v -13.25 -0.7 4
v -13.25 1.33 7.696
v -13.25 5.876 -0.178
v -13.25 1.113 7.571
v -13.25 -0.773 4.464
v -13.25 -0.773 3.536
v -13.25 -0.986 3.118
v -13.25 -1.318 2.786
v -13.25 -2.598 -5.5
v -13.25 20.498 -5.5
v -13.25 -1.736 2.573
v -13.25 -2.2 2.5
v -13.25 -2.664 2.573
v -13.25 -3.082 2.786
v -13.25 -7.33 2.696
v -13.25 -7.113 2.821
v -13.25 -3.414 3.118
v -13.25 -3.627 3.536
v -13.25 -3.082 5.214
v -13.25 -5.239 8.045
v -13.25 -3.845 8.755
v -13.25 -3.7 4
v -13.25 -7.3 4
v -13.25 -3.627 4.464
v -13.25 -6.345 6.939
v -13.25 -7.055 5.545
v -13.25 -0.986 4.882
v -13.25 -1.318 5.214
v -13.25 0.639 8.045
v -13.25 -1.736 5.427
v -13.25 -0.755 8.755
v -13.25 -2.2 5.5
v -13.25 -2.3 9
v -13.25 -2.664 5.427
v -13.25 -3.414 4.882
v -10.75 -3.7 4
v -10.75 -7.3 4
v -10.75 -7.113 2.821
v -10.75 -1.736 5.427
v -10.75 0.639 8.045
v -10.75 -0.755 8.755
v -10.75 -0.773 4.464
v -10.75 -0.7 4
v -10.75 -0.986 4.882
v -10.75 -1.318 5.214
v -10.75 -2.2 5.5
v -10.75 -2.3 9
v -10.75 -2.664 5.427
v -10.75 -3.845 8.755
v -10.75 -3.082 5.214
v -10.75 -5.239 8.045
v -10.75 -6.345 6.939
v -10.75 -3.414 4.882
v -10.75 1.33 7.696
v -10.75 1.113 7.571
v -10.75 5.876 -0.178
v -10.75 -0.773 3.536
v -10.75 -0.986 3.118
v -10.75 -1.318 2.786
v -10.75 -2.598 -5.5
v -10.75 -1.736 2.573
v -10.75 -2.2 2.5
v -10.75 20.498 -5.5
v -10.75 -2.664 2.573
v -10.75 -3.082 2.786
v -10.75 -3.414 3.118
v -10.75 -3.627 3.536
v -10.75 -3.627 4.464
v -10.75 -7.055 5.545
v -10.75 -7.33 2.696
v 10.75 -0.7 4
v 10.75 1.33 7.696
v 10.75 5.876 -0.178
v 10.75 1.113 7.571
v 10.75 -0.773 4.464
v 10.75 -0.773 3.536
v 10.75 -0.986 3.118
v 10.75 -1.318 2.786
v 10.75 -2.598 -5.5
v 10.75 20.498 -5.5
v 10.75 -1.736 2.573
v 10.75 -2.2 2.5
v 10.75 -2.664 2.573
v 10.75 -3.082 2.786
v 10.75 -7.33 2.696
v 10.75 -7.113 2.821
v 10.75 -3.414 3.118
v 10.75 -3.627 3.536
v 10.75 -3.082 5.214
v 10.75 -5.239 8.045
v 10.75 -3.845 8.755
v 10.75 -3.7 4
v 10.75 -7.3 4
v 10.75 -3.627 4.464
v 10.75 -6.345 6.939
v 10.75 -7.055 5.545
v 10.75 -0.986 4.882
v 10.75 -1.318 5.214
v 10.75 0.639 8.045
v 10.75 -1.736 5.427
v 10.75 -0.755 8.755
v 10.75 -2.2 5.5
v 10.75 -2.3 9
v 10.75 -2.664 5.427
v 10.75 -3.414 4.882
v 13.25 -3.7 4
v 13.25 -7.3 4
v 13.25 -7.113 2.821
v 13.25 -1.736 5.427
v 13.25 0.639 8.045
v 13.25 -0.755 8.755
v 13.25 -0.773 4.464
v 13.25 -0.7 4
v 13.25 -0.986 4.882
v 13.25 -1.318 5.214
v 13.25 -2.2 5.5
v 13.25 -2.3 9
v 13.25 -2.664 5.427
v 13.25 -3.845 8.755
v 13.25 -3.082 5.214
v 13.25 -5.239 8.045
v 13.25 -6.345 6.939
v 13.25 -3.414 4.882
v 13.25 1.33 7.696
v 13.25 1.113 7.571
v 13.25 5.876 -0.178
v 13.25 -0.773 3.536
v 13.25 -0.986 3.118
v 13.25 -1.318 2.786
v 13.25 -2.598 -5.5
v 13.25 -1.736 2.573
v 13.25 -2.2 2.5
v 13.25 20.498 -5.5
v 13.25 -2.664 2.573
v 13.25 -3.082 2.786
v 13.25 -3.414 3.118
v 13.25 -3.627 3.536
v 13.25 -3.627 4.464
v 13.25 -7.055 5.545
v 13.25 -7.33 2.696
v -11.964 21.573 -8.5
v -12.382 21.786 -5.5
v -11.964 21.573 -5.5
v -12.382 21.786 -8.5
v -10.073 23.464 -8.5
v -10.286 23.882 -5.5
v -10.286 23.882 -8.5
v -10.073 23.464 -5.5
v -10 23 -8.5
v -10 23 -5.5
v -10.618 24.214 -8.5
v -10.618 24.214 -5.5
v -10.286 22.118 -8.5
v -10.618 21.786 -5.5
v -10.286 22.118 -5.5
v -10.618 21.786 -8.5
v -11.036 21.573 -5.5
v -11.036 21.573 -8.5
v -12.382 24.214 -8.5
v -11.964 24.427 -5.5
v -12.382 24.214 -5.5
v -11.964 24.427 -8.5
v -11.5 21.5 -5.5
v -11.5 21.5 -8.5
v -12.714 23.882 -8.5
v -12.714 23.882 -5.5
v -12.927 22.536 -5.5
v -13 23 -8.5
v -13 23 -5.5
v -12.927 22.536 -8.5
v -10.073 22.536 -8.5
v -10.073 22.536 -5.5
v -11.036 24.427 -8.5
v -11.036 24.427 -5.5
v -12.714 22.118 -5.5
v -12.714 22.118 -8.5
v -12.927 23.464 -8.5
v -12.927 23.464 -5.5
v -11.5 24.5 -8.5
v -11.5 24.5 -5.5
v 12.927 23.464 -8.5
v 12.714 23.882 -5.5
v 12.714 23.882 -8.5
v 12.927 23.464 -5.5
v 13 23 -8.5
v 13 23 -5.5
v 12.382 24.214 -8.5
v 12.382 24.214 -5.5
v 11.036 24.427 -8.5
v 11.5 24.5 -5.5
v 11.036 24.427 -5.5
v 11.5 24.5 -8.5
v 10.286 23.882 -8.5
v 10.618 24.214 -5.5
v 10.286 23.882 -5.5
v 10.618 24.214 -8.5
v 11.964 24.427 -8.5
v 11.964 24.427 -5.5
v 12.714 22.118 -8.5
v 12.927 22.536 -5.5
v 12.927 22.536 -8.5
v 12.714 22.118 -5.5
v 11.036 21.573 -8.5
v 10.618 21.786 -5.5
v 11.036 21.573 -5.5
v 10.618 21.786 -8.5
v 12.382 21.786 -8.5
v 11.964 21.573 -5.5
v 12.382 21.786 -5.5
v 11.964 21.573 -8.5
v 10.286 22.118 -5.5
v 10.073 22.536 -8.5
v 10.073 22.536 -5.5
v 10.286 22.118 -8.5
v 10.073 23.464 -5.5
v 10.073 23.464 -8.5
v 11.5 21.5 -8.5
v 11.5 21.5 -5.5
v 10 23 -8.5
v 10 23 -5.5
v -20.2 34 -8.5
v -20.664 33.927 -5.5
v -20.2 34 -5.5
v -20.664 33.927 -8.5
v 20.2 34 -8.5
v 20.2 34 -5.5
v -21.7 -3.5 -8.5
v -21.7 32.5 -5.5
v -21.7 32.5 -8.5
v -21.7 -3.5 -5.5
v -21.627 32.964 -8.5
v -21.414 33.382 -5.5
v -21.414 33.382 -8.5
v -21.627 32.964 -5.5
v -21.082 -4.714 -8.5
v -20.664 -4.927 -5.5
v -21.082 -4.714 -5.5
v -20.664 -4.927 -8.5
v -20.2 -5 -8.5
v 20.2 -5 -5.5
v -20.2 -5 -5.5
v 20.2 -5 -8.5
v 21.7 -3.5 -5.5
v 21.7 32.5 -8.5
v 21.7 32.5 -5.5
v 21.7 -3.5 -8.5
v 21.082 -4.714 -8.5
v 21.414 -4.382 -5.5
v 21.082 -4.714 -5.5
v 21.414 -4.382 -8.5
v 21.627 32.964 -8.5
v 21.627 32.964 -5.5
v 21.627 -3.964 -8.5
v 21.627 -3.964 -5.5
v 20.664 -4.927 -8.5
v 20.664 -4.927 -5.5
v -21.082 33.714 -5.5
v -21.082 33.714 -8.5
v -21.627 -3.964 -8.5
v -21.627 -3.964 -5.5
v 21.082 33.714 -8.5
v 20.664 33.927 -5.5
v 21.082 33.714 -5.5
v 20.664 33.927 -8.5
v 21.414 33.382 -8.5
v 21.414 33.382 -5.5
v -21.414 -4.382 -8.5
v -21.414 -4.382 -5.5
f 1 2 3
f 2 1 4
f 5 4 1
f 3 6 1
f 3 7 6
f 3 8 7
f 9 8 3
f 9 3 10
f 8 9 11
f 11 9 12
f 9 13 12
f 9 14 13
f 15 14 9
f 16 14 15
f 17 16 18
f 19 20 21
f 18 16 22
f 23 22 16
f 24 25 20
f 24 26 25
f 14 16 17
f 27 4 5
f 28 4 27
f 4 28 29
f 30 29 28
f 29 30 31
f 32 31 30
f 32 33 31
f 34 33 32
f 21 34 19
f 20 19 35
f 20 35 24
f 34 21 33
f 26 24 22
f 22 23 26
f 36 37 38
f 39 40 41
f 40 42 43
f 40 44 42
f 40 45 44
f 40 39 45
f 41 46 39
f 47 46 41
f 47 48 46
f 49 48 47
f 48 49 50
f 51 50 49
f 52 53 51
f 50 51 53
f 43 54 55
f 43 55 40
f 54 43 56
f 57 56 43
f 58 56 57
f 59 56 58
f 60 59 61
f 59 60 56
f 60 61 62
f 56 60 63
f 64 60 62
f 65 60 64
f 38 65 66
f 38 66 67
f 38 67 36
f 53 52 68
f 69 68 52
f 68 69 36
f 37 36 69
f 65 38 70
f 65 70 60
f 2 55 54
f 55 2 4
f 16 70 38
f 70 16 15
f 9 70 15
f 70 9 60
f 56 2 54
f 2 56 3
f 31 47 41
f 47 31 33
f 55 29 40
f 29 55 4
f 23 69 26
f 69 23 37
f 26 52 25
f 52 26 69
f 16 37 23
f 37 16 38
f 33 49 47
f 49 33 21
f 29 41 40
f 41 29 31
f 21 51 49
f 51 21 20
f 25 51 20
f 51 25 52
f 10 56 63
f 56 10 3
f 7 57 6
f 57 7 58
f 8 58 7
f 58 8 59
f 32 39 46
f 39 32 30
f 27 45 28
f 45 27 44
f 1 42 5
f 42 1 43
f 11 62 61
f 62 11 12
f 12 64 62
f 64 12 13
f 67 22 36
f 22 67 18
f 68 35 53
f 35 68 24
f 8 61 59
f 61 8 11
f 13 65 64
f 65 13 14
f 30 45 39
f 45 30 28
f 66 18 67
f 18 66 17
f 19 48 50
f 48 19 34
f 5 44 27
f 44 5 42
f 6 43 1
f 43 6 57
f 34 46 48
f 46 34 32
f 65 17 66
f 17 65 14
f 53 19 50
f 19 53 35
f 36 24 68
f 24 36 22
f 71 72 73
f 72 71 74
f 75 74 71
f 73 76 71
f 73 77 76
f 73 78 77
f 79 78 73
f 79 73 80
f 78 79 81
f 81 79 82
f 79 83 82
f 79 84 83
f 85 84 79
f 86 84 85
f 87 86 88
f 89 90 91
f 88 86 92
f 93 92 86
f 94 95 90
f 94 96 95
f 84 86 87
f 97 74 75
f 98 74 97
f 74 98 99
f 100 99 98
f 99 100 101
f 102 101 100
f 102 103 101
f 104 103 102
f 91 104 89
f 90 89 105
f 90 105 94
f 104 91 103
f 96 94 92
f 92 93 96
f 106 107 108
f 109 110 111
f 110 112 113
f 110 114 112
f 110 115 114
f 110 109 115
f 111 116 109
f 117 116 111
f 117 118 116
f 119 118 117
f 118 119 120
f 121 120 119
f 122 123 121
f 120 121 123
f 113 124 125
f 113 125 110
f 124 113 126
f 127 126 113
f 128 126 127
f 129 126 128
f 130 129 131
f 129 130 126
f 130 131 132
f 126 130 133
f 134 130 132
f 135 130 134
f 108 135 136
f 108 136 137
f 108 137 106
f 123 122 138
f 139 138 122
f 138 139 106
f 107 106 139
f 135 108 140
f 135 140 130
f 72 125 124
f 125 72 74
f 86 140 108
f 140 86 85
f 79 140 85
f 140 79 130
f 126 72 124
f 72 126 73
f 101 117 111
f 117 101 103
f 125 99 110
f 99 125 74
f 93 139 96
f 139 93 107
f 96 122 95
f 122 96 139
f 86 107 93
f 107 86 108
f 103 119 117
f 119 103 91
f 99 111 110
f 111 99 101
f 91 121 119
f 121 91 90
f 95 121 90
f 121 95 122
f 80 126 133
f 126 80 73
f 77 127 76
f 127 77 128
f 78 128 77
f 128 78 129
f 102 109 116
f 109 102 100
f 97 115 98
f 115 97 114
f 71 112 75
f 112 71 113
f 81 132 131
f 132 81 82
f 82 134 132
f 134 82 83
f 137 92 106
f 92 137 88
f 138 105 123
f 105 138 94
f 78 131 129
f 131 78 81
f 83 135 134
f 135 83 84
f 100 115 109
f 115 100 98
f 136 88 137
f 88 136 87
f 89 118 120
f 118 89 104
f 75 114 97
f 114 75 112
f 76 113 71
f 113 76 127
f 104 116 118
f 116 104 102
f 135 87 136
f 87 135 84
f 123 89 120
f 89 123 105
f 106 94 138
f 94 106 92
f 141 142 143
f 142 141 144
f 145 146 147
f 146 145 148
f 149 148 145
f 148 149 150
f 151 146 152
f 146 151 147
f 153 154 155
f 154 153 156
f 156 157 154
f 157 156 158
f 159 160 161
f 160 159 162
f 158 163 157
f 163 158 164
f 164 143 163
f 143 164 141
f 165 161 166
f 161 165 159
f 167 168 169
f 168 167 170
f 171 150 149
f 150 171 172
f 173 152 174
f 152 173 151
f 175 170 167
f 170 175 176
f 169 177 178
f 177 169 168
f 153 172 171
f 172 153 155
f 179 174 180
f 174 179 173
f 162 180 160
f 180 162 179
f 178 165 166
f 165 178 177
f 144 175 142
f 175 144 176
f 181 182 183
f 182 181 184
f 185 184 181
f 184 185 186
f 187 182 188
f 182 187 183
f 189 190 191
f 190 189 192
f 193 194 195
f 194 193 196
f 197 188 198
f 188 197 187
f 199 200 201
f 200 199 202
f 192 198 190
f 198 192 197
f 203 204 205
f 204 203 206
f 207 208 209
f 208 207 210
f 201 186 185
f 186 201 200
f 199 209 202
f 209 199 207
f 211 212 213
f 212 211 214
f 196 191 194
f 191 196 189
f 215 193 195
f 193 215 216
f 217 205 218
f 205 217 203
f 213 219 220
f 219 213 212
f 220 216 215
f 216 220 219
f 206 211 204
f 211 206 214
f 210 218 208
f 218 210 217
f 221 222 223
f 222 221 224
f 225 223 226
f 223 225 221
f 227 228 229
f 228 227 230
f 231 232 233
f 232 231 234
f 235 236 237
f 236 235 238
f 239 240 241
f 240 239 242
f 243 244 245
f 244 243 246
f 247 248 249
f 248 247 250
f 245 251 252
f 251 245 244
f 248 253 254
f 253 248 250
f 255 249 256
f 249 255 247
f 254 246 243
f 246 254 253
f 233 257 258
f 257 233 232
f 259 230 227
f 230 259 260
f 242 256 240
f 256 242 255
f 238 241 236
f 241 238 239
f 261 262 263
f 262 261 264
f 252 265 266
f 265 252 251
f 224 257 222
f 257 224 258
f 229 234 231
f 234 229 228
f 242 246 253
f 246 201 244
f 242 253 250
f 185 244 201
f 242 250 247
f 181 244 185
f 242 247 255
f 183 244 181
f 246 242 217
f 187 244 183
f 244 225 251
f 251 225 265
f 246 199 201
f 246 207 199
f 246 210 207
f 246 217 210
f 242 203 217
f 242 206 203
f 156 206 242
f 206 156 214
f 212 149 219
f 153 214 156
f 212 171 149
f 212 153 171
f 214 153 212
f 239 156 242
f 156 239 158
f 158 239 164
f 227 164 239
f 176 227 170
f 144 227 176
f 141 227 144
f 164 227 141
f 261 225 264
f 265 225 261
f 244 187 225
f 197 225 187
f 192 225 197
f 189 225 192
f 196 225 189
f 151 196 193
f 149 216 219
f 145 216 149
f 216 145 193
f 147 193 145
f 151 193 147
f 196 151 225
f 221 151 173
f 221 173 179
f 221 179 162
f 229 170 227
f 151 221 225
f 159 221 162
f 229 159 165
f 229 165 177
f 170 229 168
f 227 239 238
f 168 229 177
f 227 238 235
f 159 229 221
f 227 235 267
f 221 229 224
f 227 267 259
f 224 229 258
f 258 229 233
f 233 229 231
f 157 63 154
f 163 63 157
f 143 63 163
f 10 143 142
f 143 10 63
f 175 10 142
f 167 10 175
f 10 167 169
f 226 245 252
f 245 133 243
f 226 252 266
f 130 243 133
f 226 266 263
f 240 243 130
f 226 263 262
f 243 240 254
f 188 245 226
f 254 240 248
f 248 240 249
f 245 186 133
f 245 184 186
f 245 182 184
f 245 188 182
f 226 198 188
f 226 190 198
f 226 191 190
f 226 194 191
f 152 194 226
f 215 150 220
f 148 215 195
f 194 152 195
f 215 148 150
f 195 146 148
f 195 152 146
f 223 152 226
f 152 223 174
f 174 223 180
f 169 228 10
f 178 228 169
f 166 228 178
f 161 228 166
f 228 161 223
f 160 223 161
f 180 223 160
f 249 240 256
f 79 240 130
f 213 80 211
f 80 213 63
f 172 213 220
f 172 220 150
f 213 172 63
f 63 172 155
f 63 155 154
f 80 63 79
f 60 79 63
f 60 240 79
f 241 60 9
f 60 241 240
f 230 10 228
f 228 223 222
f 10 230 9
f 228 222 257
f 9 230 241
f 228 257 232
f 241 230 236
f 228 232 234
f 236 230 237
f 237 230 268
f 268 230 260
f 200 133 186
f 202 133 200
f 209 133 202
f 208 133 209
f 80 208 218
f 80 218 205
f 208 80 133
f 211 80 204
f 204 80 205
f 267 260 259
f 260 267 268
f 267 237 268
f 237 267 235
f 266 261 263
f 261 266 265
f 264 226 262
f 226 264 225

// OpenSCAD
//Compass Mounting Bracket
$fn=20;
module side() {
    difference() {
        union() {
            rotate([30,0,0]) cube ([2.5,10.0,12.0], center=true) ;
    
            translate([0,-2.3,4]) rotate([0,90,0])  cylinder(h=2.5, d=10, center=true);
            translate([0,10,-7]) rotate ([70,0,0]) cube([2.5,10,19], center=true) ;
        }
        union() {
            translate([0,-2.2,4]) rotate([0,90,0]) cylinder(h=6,d=3,center=true);
            translate([0,8,-14]) rotate([0,0,0]) cube([3.5,28,15], center=true);
        }
    }
}

module base(){
  
       difference() {
        hull() {  
                                translate([-20.2,32.5,-7])   cylinder(h=3,d=3,center=true);   
                               translate([20.2,32.5,-7])   cylinder(h=3,d=3,center=true);  
                               translate([-20.2,-3.5,-7])   cylinder(h=3,d=3,center=true);  
                               translate([20.2,-3.5,-7])   cylinder(h=3,d=3,center=true); 
}
   // translate([0,15,-7]) cube([42,38,3],center=true);
        union(){
            
       %translate([0,-2,-7]) cube([21,6.3,3.5],center=true);
             translate([-11.5,23,-7])   cylinder(h=6,d=3,center=true);
                translate([11.5,23,-7])   cylinder(h=6,d=3,center=true);
      
        }    
}

        


}

 translate([-12,0,0]) side() ; 
translate([12,0,0]) side() ;
base();
